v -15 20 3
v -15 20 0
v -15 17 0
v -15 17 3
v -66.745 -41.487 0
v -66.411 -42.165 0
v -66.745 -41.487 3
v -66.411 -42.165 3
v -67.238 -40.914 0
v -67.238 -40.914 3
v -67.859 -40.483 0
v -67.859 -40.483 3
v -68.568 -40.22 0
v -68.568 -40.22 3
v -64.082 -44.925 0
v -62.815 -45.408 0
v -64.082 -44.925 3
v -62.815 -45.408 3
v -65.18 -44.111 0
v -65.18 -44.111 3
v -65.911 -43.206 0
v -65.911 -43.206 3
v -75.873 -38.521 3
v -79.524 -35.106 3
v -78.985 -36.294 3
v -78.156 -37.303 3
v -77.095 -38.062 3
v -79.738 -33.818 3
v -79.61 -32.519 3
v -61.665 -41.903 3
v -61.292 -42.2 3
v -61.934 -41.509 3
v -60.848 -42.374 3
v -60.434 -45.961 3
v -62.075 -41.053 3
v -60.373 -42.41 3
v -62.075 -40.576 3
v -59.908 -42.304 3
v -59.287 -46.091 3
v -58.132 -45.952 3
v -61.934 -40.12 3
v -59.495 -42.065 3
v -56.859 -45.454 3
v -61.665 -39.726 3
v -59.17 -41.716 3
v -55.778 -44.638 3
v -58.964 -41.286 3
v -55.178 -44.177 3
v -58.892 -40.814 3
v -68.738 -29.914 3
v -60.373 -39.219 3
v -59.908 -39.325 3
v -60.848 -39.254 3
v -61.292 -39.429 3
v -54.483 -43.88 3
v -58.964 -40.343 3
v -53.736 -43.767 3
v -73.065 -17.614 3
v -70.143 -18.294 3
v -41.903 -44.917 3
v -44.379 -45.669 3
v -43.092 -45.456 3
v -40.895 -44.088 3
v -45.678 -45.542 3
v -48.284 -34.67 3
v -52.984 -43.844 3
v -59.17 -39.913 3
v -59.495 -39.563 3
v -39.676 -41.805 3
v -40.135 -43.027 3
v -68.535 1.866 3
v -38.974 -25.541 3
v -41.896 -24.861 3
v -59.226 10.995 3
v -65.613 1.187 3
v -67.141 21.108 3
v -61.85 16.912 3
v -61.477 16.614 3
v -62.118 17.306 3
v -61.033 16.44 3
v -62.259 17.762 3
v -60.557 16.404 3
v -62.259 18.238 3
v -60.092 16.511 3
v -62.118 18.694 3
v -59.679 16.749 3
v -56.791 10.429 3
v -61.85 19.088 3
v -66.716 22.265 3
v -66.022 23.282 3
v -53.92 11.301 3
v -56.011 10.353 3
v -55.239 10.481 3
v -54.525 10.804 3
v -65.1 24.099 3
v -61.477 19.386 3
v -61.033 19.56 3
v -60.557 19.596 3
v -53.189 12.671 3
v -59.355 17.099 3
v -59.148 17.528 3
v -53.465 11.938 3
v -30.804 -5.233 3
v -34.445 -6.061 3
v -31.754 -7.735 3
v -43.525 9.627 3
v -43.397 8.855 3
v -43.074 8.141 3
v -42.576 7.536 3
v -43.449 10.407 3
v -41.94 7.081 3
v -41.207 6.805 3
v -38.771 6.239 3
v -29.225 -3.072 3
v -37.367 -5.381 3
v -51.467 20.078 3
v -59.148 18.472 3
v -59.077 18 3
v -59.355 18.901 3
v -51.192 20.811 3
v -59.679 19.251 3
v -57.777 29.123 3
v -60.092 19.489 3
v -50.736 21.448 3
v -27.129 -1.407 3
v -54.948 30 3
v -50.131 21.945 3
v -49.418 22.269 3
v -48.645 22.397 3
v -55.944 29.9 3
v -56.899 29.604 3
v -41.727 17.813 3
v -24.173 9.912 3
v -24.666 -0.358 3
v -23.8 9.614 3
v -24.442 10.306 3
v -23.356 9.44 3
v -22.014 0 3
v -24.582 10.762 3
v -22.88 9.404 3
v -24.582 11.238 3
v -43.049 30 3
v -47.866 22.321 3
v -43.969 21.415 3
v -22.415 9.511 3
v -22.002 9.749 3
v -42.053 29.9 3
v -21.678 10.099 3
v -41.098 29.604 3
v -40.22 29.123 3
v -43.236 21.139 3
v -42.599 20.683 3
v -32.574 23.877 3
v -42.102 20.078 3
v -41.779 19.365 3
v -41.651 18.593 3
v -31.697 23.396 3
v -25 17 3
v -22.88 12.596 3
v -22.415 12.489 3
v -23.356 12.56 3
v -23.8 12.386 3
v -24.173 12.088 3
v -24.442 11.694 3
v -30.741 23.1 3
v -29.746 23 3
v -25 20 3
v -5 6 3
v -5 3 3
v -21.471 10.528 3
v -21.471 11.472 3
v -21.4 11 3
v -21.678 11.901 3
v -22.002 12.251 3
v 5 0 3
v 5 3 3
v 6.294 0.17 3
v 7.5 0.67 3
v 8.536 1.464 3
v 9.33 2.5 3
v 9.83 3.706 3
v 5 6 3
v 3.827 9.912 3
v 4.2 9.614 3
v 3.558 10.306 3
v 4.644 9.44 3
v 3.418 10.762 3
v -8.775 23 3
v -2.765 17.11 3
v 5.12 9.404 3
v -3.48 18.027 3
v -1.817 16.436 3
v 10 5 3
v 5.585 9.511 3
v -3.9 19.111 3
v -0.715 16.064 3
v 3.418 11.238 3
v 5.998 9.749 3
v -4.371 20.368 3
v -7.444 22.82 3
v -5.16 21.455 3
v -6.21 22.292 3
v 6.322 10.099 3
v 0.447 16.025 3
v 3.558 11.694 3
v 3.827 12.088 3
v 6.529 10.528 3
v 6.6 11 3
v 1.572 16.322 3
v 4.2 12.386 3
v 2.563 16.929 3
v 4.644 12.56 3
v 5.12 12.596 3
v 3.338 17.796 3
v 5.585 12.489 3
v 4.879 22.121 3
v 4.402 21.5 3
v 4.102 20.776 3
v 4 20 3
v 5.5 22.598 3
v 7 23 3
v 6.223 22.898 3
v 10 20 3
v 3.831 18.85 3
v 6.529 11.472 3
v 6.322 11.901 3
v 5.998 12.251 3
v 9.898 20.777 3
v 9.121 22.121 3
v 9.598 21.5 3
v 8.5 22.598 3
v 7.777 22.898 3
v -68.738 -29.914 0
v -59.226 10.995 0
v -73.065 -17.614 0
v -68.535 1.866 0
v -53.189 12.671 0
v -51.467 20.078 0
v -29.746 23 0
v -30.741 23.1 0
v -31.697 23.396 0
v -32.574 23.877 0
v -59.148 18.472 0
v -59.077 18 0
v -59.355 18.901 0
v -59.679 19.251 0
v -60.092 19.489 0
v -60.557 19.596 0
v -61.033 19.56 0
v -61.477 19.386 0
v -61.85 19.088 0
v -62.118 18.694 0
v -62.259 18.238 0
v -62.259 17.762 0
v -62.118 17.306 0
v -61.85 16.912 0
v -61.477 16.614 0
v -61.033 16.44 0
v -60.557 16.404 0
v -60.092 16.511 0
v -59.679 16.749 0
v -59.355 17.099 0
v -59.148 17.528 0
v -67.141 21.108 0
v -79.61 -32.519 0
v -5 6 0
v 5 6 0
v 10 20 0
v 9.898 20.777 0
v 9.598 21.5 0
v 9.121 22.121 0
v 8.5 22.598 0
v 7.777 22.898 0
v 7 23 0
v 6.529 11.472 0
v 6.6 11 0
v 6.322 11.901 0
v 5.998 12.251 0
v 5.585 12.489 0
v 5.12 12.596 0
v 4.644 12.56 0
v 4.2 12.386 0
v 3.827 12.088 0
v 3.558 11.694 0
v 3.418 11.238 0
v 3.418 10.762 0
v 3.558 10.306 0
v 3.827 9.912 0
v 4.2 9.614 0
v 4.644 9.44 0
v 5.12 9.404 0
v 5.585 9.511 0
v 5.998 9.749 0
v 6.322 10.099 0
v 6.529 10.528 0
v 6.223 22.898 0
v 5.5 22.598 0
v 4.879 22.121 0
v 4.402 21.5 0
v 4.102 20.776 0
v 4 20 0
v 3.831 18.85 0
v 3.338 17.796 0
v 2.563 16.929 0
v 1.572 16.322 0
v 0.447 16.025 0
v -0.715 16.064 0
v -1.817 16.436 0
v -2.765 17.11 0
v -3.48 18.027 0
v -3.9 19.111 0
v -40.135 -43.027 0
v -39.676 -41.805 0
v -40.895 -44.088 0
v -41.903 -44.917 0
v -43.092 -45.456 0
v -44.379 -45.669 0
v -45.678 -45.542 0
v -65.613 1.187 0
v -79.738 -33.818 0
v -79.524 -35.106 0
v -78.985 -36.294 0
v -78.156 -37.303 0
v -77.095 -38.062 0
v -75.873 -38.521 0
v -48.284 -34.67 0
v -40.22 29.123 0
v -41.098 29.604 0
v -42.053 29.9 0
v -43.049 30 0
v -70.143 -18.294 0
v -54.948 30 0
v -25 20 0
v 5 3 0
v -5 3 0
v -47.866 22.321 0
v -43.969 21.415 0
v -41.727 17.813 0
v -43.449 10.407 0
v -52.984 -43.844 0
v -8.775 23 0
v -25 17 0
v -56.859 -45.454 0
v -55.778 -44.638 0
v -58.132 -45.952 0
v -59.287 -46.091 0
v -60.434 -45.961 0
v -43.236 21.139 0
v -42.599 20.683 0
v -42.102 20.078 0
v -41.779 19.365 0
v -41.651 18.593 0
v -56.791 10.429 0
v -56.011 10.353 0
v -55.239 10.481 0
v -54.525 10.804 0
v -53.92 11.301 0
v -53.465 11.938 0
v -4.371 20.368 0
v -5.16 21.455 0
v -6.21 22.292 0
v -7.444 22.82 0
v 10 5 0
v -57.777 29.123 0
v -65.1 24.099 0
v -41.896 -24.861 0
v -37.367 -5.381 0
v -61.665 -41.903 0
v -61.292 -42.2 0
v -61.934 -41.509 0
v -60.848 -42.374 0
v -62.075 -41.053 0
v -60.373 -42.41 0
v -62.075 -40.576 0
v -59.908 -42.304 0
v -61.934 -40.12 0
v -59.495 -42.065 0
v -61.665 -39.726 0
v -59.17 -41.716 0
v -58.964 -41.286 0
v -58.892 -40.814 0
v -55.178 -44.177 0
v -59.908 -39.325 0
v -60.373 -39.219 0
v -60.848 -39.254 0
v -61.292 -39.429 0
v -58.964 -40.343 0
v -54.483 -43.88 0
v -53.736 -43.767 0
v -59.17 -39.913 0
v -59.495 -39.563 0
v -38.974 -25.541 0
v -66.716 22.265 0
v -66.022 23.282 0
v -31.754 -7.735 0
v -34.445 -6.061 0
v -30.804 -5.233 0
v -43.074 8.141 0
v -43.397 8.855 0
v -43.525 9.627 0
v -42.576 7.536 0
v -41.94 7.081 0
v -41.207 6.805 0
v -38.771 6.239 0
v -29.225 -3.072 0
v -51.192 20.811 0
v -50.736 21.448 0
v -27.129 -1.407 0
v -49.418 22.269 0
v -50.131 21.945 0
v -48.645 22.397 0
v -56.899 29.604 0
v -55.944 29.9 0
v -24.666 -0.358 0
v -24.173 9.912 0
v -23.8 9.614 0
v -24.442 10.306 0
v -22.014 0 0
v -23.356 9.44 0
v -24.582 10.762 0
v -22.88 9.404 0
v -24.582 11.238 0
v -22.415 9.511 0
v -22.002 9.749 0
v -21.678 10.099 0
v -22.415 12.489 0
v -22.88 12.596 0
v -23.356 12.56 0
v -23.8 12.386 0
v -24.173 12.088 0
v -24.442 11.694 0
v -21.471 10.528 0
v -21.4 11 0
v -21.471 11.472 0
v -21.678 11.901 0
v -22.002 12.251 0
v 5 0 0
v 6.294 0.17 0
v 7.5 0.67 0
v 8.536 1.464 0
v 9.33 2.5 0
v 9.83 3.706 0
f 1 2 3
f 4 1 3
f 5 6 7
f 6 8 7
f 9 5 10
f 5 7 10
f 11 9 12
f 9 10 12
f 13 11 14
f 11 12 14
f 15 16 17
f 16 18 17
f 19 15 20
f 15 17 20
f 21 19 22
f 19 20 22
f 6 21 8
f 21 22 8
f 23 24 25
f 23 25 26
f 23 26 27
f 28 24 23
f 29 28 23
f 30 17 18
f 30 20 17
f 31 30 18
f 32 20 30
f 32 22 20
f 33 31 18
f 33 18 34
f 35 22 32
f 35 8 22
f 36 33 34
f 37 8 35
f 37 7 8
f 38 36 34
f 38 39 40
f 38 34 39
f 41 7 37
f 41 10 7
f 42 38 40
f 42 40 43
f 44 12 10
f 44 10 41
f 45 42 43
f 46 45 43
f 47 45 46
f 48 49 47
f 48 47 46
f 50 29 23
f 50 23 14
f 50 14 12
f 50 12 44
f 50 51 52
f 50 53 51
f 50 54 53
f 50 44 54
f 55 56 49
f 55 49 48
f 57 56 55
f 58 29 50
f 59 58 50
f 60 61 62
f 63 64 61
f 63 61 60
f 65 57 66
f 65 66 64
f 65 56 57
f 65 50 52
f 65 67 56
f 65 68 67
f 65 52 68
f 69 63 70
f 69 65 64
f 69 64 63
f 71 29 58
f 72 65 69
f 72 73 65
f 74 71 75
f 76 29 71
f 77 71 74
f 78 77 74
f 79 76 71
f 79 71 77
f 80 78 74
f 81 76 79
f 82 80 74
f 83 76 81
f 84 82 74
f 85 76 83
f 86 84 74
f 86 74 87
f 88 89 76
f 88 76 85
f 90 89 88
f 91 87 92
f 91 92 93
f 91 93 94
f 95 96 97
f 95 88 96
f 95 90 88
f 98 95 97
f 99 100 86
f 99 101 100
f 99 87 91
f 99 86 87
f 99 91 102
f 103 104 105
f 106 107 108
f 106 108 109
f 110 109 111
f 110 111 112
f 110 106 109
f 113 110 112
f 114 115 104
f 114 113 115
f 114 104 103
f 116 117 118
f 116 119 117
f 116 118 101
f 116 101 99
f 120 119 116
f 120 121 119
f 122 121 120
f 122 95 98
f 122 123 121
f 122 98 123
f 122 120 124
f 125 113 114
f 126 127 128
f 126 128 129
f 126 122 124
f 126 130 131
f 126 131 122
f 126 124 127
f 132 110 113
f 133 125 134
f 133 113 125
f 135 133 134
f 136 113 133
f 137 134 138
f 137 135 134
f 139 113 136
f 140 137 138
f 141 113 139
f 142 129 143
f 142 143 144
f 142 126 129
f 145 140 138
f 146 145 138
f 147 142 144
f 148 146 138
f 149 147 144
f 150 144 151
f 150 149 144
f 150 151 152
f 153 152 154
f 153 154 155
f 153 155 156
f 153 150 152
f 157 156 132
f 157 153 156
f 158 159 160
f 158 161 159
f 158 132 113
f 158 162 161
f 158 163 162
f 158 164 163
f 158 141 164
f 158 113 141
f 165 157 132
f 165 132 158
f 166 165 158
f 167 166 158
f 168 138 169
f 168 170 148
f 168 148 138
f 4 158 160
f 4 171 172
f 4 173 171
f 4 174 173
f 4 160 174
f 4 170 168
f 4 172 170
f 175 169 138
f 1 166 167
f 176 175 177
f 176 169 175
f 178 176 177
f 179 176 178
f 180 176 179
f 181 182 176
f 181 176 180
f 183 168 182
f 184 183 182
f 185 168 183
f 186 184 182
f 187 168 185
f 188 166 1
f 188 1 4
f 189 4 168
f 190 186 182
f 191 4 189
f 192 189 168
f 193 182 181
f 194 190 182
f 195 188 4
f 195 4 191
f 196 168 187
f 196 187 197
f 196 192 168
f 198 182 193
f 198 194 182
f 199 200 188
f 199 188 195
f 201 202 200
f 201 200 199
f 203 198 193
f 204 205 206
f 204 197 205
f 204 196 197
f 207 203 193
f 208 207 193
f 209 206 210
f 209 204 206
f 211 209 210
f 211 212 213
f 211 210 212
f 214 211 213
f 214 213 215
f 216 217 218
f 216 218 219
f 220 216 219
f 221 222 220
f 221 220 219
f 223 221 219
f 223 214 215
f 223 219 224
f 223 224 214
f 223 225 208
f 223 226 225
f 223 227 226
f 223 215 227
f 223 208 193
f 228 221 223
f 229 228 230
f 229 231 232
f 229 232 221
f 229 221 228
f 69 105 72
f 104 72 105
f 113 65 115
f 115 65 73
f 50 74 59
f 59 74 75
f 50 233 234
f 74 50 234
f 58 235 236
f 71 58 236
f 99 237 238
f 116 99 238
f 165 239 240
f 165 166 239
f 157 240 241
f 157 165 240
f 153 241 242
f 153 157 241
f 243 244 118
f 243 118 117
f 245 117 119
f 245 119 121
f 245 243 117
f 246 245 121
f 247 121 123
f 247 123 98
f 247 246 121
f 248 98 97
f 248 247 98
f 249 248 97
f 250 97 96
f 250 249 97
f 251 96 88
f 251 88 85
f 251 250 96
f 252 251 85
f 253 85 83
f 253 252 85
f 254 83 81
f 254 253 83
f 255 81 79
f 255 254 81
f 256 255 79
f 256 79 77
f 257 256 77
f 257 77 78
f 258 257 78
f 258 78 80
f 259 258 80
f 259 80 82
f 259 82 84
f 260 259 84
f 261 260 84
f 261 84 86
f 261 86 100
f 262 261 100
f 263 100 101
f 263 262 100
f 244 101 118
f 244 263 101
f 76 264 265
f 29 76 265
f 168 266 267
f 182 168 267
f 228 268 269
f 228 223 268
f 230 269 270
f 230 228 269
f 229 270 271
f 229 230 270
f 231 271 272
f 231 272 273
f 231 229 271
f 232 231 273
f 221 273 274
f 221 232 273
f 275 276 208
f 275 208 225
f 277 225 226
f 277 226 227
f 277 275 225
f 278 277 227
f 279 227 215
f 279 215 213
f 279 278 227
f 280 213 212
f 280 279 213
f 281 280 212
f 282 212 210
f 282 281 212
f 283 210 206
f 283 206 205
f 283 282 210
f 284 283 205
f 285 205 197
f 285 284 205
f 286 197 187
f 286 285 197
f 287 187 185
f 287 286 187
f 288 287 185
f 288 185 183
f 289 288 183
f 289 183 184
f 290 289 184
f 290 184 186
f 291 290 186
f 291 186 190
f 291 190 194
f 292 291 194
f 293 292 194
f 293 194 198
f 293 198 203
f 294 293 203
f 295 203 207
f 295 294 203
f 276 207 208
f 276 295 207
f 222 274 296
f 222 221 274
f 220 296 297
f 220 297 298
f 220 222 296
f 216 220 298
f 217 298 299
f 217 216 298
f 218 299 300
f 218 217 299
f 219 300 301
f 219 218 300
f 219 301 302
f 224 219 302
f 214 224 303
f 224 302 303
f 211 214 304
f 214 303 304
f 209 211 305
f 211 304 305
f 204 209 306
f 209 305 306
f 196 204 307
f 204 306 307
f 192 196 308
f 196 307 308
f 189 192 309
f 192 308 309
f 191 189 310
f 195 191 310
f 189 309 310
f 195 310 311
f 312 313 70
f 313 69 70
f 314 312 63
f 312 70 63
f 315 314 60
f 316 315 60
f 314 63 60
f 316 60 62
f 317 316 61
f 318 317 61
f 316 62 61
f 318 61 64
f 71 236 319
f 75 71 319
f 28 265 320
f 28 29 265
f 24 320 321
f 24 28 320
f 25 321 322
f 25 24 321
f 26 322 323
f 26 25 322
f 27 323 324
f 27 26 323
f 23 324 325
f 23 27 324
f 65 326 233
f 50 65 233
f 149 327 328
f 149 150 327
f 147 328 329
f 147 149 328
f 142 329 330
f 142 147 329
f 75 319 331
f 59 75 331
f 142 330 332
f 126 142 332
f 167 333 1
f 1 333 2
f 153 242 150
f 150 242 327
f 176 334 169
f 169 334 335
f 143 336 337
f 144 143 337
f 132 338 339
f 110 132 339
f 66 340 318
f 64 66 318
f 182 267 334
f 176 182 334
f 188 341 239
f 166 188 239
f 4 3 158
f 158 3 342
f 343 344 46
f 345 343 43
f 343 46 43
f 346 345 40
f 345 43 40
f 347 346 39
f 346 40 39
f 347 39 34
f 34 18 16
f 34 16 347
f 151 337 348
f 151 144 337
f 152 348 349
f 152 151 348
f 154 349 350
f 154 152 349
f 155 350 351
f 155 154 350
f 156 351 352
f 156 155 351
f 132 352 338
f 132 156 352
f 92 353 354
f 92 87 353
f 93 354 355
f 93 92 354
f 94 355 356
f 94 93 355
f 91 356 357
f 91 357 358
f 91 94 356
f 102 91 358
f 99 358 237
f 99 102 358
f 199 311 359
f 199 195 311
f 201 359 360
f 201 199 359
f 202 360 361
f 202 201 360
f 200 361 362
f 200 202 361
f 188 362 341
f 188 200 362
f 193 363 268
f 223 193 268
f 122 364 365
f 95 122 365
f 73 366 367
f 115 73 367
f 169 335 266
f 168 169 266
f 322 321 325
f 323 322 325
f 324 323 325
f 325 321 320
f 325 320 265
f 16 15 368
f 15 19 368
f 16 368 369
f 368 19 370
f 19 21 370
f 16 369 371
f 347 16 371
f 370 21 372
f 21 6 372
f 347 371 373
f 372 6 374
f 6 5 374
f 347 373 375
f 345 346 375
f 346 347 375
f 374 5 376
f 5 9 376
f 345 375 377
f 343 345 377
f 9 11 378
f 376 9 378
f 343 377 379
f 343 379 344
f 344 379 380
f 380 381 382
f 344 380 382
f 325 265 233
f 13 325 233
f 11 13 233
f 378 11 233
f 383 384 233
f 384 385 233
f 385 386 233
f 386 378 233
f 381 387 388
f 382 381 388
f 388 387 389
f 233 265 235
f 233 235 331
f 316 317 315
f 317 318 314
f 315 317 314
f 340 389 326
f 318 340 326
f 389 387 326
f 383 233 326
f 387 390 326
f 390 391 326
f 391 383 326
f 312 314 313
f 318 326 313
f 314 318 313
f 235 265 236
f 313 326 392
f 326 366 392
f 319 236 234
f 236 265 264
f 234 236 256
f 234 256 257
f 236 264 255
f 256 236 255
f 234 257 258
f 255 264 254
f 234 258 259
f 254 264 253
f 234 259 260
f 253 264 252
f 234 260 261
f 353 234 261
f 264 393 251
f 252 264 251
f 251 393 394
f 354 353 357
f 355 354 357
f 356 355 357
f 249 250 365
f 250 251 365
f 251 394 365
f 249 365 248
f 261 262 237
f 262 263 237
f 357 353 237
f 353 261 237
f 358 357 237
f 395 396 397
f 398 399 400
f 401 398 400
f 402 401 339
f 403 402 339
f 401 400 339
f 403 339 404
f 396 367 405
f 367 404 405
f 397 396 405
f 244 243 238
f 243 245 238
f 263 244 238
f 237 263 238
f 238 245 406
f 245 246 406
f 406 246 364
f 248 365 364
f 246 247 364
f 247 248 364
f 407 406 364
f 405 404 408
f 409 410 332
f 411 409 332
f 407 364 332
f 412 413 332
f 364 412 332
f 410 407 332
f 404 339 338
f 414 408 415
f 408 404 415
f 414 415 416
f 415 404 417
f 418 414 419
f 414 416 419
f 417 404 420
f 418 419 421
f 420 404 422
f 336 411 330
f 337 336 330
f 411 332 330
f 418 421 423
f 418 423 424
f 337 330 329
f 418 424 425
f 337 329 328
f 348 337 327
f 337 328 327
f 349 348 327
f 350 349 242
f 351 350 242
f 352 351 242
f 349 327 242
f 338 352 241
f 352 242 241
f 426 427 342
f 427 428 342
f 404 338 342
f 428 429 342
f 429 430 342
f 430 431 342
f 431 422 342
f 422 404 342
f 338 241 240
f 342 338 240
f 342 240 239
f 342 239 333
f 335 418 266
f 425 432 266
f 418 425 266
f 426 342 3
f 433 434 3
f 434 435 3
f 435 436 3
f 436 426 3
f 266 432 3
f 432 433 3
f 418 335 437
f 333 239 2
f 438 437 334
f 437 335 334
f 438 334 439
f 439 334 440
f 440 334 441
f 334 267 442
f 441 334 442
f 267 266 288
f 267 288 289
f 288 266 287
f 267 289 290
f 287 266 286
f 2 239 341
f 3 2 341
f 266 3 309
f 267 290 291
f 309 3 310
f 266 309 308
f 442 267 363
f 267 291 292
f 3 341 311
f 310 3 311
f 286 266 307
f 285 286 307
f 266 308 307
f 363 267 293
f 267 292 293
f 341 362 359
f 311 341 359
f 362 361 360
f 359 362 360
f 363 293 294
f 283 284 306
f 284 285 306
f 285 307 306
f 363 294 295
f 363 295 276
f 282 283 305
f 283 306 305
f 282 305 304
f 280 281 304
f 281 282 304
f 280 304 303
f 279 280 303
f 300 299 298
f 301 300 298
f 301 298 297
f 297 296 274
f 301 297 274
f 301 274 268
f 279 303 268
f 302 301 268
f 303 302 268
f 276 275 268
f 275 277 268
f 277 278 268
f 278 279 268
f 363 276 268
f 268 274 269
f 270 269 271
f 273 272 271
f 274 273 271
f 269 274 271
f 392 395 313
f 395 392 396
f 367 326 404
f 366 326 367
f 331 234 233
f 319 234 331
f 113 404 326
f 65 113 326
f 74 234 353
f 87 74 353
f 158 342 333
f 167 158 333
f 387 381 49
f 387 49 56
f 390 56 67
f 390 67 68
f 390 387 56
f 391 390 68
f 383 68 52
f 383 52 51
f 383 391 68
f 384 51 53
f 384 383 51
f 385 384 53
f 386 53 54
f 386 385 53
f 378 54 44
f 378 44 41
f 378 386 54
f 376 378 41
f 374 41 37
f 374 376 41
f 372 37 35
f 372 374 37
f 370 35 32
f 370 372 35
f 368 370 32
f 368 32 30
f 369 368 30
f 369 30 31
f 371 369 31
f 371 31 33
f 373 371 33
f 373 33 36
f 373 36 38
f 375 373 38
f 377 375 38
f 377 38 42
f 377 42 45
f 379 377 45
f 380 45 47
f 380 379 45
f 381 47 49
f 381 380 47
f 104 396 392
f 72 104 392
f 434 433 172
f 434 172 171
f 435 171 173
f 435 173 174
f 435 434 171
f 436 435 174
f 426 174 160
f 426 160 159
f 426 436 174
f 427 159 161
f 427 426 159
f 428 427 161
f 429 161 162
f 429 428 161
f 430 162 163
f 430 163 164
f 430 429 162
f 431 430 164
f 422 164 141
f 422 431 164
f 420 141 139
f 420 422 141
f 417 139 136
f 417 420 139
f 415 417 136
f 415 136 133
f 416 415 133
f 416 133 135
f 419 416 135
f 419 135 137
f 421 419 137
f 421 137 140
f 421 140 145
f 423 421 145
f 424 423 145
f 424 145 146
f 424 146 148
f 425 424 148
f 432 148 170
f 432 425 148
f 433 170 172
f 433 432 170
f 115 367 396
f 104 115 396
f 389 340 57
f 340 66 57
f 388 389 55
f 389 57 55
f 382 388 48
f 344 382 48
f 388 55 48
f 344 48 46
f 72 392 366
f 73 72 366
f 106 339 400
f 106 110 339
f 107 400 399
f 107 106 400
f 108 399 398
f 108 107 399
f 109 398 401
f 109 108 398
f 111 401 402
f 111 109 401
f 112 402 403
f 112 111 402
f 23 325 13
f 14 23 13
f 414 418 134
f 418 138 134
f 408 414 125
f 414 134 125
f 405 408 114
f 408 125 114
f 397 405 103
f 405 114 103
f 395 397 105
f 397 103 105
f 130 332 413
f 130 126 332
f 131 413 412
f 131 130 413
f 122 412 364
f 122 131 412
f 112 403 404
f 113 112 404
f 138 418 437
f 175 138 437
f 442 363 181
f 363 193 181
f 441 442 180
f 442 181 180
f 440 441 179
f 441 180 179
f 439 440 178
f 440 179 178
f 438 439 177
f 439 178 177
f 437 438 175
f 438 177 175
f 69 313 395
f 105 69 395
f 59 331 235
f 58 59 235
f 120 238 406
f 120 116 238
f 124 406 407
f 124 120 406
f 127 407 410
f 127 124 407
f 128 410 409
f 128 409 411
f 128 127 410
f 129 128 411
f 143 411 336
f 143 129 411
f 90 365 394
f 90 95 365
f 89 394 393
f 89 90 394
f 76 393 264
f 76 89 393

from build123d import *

# Parameters (mm, degrees)
ESBO_O1_R                = 1.6000000000000096
ESBO_O1_R_2              = 1.5999999999999985
ESBO_O1_R_3              = 1.6000000000000019
ESBO_O1_R_4              = 1.6000000000000474
RESSALTO_EXTRUS_O1_DEPTH = 3
FILETE1_R                = 5
FILETE3_R                = 3
FILETE4_R                = 10
FILETE2_R                = 5


with BuildPart() as part:
    # Esboço1 → Ressalto-extrusão1 (new body)
    with BuildSketch(Plane.XY):
        with BuildLine():
            Line((-2.645751311064564, 23.000000000000014), (-31.296028057599443, 23.000000000000004))
            Line((-31.296028057599443, 22.999999999999996), (-41.49853289297047, 29.999999999999996))
            Line((-41.49853289297047, 29.999999999999996), (-56.49853289297047, 29.999999999999996))
            Line((-56.49853289297047, 29.999999999999996), (-66.7010377283415, 23.000000000000014))
            Line((-66.7010377283415, 23.000000000000014), (-80.74287914122172, -37.388961654722316))
            Line((-80.74287914122172, -37.388961654722316), (-65.64563872754113, -40.89942200794237))
            Line((-65.64563872754113, -40.89942200794238), (-66.49494365170727, -44.55198017254248))
            Line((-66.49494365170727, -44.55198017254248), (-56.754788546106894, -46.81679330365219))
            Line((-56.754788546106894, -46.81679330365219), (-55.90548362194077, -43.164235139052074))
            Line((-55.90548362194077, -43.164235139052074), (-40.80824320826024, -46.67469549227213))
            Line((-40.80824320826024, -46.67469549227213), (-29.955288394361567, 0))
            Line((-29.955288394361567, 0), (10, 0))
            Line((10.000000000000002, 0), (10.000000000000002, 23))
            Line((10.000000000000002, 23), (2.6457513110645188, 23.000000000000036))
            ThreePointArc((2.6457513110645325, 23.00000000000005), (2.416e-14, 16), (-2.645751311064569, 23.000000000000018))
        make_face()
        with Locations((-60.49245953335222, -40.81430918529715)):
            Circle(ESBO_O1_R, mode=Mode.SUBTRACT)
        Polygon((-34.44455590239048, -6.060615619977682), (-38.97418216460989, -25.54092583117841), (-41.89622869629002, -24.861481891845507), (-37.36660243407061, -5.381171680644762), align=None, mode=Mode.SUBTRACT)
        Polygon((-70.1426785025311, -18.293523811627356), (-73.06472503421121, -17.61407987229443), (-68.53509877199181, 1.8662303389063053), (-65.61305224031169, 1.1867863995733905), align=None, mode=Mode.SUBTRACT)
        Polygon((-53.86861044577067, 9.749384541179593), (-50.787533444320594, 22.999999999999996), (-41.04737833872022, 20.73518686889029), (-44.12845534017028, 7.484571410069881), (-38.771370032090054, 6.238924187959525), (-48.28358518275084, -34.669727255562044), (-68.73791090451164, -29.91361968023165), (-59.22569575385083, 10.995031763289926), align=None, mode=Mode.SUBTRACT)
        with Locations((-60.676910421506925, 17.999999999999996)):
            Circle(ESBO_O1_R_2, mode=Mode.SUBTRACT)
        Polygon((5.000000000000001, 6), (5, 3.0000000000000018), (-5, 2.9999999999999996), (-5.000000000000001, 5.999999999999999), align=None, mode=Mode.SUBTRACT)
        with Locations((-23.000000000000014, 10.999999999999996)):
            Circle(ESBO_O1_R_3, mode=Mode.SUBTRACT)
        Polygon((-14.999999999999993, 16.999999999999996), (-24.999999999999993, 16.999999999999993), (-24.999999999999993, 19.999999999999996), (-14.999999999999993, 19.999999999999996), align=None, mode=Mode.SUBTRACT)
        with Locations((5.000000000000001, 10.999999999999996)):
            Circle(ESBO_O1_R_4, mode=Mode.SUBTRACT)
    extrude(amount=RESSALTO_EXTRUS_O1_DEPTH)

    # Filete1
    filete1_edges = [part.edges().sort_by_distance(p)[0] for p in [
        (10, 0, 1.5),
        (-40.80824320826024, -46.67469549227213, 1.5),
        (-80.74287914122172, -37.388961654722316, 1.5),
    ]]
    fillet(filete1_edges, radius=FILETE1_R)

    # Filete3
    filete3_edges = [part.edges().sort_by_distance(p)[0] for p in [
        (-65.64563872754113, -40.89942200794238, 1.5),
        (-55.90548362194077, -43.164235139052074, 1.5),
        (2.6457513110645263, 23.000000000000043, 1.5),
        (10.000000000000002, 23, 1.5),
        (-50.787533444320594, 22.999999999999996, 1.5),
        (-41.04737833872022, 20.73518686889029, 1.5),
        (-44.12845534017028, 7.484571410069877, 1.5),
        (-53.86861044577067, 9.749384541179591, 1.5),
    ]]
    fillet(filete3_edges, radius=FILETE3_R - 0.0001)  # a hair under: the kernel refuses the full size

    # Filete4
    filete4_edges = [part.edges().sort_by_distance(p)[0] for p in [
        (-29.955288394361567, 0, 1.5),
    ]]
    fillet(filete4_edges, radius=FILETE4_R)

    # Filete2
    filete2_edges = [part.edges().sort_by_distance(p)[0] for p in [
        (-2.6457513110645667, 23.000000000000014, 1.5),
        (-56.754788546106894, -46.81679330365219, 1.5),
        (-66.49494365170727, -44.55198017254248, 1.5),
        (-31.296028057599443, 23, 1.5),
        (-41.49853289297047, 29.999999999999996, 1.5),
        (-56.49853289297047, 29.999999999999996, 1.5),
        (-66.7010377283415, 23.000000000000014, 1.5),
    ]]
    fillet(filete2_edges, radius=FILETE2_R - 0.0001)  # a hair under: the kernel refuses the full size


solid = part.part
